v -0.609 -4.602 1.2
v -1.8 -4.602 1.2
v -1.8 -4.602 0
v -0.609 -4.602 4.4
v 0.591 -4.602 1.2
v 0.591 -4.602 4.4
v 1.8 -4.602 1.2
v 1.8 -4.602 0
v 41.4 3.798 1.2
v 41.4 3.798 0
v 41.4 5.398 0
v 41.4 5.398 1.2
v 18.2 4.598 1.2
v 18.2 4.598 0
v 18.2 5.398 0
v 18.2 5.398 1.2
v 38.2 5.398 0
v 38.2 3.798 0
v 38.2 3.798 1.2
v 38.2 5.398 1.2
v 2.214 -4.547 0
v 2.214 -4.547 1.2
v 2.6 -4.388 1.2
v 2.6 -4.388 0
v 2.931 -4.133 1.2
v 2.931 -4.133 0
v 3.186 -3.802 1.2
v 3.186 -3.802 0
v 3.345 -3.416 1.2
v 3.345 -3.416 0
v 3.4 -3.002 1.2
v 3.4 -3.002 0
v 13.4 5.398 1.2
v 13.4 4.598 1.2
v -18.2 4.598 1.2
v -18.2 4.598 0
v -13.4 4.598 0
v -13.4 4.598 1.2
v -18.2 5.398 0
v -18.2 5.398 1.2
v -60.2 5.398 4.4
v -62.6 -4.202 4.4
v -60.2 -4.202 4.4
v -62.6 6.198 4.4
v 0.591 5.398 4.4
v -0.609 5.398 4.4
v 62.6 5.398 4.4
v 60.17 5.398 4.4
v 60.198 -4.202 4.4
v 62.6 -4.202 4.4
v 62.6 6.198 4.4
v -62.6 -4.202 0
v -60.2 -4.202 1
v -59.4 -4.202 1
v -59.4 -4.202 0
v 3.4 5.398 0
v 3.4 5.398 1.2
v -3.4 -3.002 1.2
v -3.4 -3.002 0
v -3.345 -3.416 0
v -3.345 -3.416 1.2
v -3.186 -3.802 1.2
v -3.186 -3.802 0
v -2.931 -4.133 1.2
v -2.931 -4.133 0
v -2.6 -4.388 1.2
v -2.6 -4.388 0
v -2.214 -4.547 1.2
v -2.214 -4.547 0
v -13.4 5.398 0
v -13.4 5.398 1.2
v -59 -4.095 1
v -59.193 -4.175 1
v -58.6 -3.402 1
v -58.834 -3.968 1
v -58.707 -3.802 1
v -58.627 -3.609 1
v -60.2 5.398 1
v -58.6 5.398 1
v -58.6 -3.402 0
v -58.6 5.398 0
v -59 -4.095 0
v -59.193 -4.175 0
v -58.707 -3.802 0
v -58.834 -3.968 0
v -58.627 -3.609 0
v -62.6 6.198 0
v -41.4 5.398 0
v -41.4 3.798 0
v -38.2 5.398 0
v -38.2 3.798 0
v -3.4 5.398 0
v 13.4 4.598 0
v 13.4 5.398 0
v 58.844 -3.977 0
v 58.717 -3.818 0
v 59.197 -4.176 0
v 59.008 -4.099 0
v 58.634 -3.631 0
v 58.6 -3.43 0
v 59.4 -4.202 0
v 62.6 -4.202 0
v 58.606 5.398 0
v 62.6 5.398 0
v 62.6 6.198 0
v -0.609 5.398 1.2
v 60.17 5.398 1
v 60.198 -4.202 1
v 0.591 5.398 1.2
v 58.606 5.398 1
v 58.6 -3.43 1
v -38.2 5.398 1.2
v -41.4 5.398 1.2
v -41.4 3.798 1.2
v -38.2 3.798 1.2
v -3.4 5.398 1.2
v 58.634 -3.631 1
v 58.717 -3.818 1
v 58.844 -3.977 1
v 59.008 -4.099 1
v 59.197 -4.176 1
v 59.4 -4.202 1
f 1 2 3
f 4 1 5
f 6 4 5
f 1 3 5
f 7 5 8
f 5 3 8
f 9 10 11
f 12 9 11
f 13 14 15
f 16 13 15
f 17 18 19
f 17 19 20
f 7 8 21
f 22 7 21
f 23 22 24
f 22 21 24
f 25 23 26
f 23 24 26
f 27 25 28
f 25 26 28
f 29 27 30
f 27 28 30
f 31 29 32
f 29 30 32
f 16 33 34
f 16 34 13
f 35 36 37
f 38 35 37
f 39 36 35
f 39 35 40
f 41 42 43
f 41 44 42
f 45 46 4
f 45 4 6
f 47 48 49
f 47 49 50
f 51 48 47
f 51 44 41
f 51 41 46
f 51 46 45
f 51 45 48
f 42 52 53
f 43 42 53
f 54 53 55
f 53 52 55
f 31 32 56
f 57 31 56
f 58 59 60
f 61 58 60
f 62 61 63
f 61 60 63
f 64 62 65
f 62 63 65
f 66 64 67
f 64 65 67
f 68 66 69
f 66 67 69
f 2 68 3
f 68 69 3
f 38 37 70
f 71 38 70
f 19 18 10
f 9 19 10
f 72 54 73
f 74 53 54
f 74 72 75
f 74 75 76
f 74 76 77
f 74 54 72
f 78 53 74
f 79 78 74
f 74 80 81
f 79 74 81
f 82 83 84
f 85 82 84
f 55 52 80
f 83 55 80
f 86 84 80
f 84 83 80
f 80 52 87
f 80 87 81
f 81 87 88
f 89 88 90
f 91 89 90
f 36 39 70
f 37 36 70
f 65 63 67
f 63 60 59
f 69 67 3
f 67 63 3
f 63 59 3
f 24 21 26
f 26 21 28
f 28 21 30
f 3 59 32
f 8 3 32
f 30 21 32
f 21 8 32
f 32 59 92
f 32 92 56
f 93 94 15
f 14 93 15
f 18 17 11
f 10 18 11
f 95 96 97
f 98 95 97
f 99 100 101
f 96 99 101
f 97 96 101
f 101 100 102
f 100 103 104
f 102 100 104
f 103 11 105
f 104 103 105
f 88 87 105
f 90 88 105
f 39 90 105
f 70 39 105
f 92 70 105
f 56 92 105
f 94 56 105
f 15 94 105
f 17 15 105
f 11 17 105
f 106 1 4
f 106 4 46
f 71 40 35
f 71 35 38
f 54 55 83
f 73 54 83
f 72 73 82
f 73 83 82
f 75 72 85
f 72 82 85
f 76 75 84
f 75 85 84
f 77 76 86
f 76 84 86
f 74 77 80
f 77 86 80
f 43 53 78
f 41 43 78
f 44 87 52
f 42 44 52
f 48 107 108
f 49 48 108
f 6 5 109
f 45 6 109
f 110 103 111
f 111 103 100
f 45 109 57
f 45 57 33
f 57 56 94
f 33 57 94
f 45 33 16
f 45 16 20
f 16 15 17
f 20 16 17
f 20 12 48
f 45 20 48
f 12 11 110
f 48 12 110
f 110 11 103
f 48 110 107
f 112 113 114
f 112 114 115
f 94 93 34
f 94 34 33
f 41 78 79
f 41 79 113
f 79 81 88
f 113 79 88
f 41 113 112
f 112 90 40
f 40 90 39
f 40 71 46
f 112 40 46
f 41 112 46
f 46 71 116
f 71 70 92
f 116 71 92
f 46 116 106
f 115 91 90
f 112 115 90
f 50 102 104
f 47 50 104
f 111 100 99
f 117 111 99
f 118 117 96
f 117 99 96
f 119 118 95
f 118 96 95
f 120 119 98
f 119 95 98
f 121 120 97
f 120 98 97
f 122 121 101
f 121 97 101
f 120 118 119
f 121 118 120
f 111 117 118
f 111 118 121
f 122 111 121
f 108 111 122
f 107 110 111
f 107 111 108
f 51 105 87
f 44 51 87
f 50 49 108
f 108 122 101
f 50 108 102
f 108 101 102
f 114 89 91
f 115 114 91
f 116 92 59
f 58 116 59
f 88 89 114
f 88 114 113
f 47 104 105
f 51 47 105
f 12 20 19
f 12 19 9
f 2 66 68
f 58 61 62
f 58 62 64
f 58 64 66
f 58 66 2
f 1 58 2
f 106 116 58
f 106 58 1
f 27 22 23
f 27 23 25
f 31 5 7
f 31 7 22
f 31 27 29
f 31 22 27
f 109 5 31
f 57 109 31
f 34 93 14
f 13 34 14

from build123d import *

# Parameters (mm, degrees)
F0_W     = 2.4
F0_H     = 9.6
F0_H_2   = 0.8
F0_W_2   = 1.2
F0_H_3   = 10
F0_W_3   = 1.6
F1_DEPTH = 4.4
F0_W_4   = 3.2
F0_H_4   = 1.6
F0_W_5   = 4.8
F2_DEPTH = 1.2
F3_DEPTH = 1


# Not quite as in the source:
# - ends of sketch curves that miss each other by under 0.0002 mm in the source are joined


with BuildPart() as f1:
    # F0 (on Top) → F1 (new body)
    with BuildSketch(Plane.XY):
        with Locations((-61.4, 0.5979961667)):
            Rectangle(F0_W, F0_H)
        with Locations((-61.4, 5.7979961667)):
            Rectangle(F0_W, F0_H_2)
        Polygon((-58.6, 5.3979961667), (-41.4000016928, 5.3979961667), (-38.2000016928, 5.3979961667), (-18.2000016928, 5.3979961667), (-13.4000016928, 5.3979961667), (-3.4000016928, 5.3979961667), (-0.6092149836, 5.3979961667), (0.5907850164, 5.3979961667), (3.3999983072, 5.3979961667), (13.4000016928, 5.3979961667), (18.2000016928, 5.3979961667), (38.2000016928, 5.3979961667), (41.4000016928, 5.3979961667), (58.6059018172, 5.3979961667), (58.6063936353, 6.1979961667), (-58.6, 6.1979961667), align=None)
        Polygon((62.5999775911, 6.1979961667), (60.1678602397, 6.1979961667), (60.1701559369, 5.3979961667), (62.5999775911, 5.3979961667), (62.5999775911, 5.7979961667), align=None)
        Polygon((62.5999775911, 5.3979961667), (60.1701559369, 5.3979961667), (60.1977043028, -4.2020038333), (62.6, -4.2020038333), align=None)
        with Locations((-0.0092149836, 0.3979961667)):
            Rectangle(F0_W_2, F0_H_3)
        with Locations((-59.4, 5.7979961667)):
            Rectangle(F0_W_3, F0_H_2)
        Polygon((60.1678602397, 6.1979961667), (58.6063936353, 6.1979961667), (58.6059018172, 5.3979961667), (60.1701559369, 5.3979961667), align=None)
    extrude(amount=F1_DEPTH)

    # F0 (on Top) → F2 (join)
    with BuildSketch(Plane.XY):
        with Locations((39.8000016928, 4.5979961667)):
            Rectangle(F0_W_4, F0_H_4)
        with Locations((15.8000016928, 4.9979961667)):
            Rectangle(F0_W_5, F0_H_2)
        with BuildLine():
            Line((3.3999983072, 5.3979961667), (0.5907850164, 5.3979961667))
            Line((0.5907850164, 5.3979961667), (0.5907850164, -4.6020038333))
            Line((0.5907850164, -4.6020038333), (1.7999983072, -4.6020038333))
            ThreePointArc((1.7999983072, -4.6020038333), (2.9313691571, -4.1333746832), (3.3999983072, -3.0020038333))
            Line((3.3999983072, -3.0020038333), (3.3999983072, 5.3979961667))
        make_face()
        with BuildLine():
            Line((-0.6092149836, 5.3979961667), (-3.4000016928, 5.3979961667))
            Line((-3.4000016928, 5.3979961667), (-3.4000016928, -3.0020038333))
            ThreePointArc((-3.4000016928, -3.0020038333), (-2.9313725427, -4.1333746832), (-1.8000016928, -4.6020038333))
            Line((-1.8000016928, -4.6020038333), (-0.6092149836, -4.6020038333))
            Line((-0.6092149836, -4.6020038333), (-0.6092149836, 5.3979961667))
        make_face()
        with Locations((-15.8000016928, 4.9979961667)):
            Rectangle(F0_W_5, F0_H_2)
        with Locations((-39.8000016928, 4.5979961667)):
            Rectangle(F0_W_4, F0_H_4)
    extrude(amount=F2_DEPTH)

    # F0 (on Top) → F3 (join)
    with BuildSketch(Plane.XY):
        with BuildLine():
            Line((-58.6, -3.4020038333), (-58.6, 5.3979961667))
            Line((-58.6, 5.3979961667), (-60.2, 5.3979961667))
            Line((-60.2, 5.3979961667), (-60.2, -4.2020038333))
            Line((-60.2, -4.2020038333), (-59.4, -4.2020038333))
            ThreePointArc((-59.4, -4.2020038333), (-58.8343145751, -3.9676892582), (-58.6, -3.4020038333))
        make_face()
        with BuildLine():
            Line((60.1701559369, 5.3979961667), (58.6059018172, 5.3979961667))
            Line((58.6059018172, 5.3979961667), (58.6004748691, -3.4295733769))
            ThreePointArc((58.6004748691, -3.4295733769), (58.8441470155, -3.9773540027), (59.3999996781, -4.2020038333))
            Line((59.3999996781, -4.2020038333), (60.1977043028, -4.2020038333))
            Line((60.1977043028, -4.2020038333), (60.1701559369, 5.3979961667))
        make_face()
    extrude(amount=F3_DEPTH)


solid = f1.part
